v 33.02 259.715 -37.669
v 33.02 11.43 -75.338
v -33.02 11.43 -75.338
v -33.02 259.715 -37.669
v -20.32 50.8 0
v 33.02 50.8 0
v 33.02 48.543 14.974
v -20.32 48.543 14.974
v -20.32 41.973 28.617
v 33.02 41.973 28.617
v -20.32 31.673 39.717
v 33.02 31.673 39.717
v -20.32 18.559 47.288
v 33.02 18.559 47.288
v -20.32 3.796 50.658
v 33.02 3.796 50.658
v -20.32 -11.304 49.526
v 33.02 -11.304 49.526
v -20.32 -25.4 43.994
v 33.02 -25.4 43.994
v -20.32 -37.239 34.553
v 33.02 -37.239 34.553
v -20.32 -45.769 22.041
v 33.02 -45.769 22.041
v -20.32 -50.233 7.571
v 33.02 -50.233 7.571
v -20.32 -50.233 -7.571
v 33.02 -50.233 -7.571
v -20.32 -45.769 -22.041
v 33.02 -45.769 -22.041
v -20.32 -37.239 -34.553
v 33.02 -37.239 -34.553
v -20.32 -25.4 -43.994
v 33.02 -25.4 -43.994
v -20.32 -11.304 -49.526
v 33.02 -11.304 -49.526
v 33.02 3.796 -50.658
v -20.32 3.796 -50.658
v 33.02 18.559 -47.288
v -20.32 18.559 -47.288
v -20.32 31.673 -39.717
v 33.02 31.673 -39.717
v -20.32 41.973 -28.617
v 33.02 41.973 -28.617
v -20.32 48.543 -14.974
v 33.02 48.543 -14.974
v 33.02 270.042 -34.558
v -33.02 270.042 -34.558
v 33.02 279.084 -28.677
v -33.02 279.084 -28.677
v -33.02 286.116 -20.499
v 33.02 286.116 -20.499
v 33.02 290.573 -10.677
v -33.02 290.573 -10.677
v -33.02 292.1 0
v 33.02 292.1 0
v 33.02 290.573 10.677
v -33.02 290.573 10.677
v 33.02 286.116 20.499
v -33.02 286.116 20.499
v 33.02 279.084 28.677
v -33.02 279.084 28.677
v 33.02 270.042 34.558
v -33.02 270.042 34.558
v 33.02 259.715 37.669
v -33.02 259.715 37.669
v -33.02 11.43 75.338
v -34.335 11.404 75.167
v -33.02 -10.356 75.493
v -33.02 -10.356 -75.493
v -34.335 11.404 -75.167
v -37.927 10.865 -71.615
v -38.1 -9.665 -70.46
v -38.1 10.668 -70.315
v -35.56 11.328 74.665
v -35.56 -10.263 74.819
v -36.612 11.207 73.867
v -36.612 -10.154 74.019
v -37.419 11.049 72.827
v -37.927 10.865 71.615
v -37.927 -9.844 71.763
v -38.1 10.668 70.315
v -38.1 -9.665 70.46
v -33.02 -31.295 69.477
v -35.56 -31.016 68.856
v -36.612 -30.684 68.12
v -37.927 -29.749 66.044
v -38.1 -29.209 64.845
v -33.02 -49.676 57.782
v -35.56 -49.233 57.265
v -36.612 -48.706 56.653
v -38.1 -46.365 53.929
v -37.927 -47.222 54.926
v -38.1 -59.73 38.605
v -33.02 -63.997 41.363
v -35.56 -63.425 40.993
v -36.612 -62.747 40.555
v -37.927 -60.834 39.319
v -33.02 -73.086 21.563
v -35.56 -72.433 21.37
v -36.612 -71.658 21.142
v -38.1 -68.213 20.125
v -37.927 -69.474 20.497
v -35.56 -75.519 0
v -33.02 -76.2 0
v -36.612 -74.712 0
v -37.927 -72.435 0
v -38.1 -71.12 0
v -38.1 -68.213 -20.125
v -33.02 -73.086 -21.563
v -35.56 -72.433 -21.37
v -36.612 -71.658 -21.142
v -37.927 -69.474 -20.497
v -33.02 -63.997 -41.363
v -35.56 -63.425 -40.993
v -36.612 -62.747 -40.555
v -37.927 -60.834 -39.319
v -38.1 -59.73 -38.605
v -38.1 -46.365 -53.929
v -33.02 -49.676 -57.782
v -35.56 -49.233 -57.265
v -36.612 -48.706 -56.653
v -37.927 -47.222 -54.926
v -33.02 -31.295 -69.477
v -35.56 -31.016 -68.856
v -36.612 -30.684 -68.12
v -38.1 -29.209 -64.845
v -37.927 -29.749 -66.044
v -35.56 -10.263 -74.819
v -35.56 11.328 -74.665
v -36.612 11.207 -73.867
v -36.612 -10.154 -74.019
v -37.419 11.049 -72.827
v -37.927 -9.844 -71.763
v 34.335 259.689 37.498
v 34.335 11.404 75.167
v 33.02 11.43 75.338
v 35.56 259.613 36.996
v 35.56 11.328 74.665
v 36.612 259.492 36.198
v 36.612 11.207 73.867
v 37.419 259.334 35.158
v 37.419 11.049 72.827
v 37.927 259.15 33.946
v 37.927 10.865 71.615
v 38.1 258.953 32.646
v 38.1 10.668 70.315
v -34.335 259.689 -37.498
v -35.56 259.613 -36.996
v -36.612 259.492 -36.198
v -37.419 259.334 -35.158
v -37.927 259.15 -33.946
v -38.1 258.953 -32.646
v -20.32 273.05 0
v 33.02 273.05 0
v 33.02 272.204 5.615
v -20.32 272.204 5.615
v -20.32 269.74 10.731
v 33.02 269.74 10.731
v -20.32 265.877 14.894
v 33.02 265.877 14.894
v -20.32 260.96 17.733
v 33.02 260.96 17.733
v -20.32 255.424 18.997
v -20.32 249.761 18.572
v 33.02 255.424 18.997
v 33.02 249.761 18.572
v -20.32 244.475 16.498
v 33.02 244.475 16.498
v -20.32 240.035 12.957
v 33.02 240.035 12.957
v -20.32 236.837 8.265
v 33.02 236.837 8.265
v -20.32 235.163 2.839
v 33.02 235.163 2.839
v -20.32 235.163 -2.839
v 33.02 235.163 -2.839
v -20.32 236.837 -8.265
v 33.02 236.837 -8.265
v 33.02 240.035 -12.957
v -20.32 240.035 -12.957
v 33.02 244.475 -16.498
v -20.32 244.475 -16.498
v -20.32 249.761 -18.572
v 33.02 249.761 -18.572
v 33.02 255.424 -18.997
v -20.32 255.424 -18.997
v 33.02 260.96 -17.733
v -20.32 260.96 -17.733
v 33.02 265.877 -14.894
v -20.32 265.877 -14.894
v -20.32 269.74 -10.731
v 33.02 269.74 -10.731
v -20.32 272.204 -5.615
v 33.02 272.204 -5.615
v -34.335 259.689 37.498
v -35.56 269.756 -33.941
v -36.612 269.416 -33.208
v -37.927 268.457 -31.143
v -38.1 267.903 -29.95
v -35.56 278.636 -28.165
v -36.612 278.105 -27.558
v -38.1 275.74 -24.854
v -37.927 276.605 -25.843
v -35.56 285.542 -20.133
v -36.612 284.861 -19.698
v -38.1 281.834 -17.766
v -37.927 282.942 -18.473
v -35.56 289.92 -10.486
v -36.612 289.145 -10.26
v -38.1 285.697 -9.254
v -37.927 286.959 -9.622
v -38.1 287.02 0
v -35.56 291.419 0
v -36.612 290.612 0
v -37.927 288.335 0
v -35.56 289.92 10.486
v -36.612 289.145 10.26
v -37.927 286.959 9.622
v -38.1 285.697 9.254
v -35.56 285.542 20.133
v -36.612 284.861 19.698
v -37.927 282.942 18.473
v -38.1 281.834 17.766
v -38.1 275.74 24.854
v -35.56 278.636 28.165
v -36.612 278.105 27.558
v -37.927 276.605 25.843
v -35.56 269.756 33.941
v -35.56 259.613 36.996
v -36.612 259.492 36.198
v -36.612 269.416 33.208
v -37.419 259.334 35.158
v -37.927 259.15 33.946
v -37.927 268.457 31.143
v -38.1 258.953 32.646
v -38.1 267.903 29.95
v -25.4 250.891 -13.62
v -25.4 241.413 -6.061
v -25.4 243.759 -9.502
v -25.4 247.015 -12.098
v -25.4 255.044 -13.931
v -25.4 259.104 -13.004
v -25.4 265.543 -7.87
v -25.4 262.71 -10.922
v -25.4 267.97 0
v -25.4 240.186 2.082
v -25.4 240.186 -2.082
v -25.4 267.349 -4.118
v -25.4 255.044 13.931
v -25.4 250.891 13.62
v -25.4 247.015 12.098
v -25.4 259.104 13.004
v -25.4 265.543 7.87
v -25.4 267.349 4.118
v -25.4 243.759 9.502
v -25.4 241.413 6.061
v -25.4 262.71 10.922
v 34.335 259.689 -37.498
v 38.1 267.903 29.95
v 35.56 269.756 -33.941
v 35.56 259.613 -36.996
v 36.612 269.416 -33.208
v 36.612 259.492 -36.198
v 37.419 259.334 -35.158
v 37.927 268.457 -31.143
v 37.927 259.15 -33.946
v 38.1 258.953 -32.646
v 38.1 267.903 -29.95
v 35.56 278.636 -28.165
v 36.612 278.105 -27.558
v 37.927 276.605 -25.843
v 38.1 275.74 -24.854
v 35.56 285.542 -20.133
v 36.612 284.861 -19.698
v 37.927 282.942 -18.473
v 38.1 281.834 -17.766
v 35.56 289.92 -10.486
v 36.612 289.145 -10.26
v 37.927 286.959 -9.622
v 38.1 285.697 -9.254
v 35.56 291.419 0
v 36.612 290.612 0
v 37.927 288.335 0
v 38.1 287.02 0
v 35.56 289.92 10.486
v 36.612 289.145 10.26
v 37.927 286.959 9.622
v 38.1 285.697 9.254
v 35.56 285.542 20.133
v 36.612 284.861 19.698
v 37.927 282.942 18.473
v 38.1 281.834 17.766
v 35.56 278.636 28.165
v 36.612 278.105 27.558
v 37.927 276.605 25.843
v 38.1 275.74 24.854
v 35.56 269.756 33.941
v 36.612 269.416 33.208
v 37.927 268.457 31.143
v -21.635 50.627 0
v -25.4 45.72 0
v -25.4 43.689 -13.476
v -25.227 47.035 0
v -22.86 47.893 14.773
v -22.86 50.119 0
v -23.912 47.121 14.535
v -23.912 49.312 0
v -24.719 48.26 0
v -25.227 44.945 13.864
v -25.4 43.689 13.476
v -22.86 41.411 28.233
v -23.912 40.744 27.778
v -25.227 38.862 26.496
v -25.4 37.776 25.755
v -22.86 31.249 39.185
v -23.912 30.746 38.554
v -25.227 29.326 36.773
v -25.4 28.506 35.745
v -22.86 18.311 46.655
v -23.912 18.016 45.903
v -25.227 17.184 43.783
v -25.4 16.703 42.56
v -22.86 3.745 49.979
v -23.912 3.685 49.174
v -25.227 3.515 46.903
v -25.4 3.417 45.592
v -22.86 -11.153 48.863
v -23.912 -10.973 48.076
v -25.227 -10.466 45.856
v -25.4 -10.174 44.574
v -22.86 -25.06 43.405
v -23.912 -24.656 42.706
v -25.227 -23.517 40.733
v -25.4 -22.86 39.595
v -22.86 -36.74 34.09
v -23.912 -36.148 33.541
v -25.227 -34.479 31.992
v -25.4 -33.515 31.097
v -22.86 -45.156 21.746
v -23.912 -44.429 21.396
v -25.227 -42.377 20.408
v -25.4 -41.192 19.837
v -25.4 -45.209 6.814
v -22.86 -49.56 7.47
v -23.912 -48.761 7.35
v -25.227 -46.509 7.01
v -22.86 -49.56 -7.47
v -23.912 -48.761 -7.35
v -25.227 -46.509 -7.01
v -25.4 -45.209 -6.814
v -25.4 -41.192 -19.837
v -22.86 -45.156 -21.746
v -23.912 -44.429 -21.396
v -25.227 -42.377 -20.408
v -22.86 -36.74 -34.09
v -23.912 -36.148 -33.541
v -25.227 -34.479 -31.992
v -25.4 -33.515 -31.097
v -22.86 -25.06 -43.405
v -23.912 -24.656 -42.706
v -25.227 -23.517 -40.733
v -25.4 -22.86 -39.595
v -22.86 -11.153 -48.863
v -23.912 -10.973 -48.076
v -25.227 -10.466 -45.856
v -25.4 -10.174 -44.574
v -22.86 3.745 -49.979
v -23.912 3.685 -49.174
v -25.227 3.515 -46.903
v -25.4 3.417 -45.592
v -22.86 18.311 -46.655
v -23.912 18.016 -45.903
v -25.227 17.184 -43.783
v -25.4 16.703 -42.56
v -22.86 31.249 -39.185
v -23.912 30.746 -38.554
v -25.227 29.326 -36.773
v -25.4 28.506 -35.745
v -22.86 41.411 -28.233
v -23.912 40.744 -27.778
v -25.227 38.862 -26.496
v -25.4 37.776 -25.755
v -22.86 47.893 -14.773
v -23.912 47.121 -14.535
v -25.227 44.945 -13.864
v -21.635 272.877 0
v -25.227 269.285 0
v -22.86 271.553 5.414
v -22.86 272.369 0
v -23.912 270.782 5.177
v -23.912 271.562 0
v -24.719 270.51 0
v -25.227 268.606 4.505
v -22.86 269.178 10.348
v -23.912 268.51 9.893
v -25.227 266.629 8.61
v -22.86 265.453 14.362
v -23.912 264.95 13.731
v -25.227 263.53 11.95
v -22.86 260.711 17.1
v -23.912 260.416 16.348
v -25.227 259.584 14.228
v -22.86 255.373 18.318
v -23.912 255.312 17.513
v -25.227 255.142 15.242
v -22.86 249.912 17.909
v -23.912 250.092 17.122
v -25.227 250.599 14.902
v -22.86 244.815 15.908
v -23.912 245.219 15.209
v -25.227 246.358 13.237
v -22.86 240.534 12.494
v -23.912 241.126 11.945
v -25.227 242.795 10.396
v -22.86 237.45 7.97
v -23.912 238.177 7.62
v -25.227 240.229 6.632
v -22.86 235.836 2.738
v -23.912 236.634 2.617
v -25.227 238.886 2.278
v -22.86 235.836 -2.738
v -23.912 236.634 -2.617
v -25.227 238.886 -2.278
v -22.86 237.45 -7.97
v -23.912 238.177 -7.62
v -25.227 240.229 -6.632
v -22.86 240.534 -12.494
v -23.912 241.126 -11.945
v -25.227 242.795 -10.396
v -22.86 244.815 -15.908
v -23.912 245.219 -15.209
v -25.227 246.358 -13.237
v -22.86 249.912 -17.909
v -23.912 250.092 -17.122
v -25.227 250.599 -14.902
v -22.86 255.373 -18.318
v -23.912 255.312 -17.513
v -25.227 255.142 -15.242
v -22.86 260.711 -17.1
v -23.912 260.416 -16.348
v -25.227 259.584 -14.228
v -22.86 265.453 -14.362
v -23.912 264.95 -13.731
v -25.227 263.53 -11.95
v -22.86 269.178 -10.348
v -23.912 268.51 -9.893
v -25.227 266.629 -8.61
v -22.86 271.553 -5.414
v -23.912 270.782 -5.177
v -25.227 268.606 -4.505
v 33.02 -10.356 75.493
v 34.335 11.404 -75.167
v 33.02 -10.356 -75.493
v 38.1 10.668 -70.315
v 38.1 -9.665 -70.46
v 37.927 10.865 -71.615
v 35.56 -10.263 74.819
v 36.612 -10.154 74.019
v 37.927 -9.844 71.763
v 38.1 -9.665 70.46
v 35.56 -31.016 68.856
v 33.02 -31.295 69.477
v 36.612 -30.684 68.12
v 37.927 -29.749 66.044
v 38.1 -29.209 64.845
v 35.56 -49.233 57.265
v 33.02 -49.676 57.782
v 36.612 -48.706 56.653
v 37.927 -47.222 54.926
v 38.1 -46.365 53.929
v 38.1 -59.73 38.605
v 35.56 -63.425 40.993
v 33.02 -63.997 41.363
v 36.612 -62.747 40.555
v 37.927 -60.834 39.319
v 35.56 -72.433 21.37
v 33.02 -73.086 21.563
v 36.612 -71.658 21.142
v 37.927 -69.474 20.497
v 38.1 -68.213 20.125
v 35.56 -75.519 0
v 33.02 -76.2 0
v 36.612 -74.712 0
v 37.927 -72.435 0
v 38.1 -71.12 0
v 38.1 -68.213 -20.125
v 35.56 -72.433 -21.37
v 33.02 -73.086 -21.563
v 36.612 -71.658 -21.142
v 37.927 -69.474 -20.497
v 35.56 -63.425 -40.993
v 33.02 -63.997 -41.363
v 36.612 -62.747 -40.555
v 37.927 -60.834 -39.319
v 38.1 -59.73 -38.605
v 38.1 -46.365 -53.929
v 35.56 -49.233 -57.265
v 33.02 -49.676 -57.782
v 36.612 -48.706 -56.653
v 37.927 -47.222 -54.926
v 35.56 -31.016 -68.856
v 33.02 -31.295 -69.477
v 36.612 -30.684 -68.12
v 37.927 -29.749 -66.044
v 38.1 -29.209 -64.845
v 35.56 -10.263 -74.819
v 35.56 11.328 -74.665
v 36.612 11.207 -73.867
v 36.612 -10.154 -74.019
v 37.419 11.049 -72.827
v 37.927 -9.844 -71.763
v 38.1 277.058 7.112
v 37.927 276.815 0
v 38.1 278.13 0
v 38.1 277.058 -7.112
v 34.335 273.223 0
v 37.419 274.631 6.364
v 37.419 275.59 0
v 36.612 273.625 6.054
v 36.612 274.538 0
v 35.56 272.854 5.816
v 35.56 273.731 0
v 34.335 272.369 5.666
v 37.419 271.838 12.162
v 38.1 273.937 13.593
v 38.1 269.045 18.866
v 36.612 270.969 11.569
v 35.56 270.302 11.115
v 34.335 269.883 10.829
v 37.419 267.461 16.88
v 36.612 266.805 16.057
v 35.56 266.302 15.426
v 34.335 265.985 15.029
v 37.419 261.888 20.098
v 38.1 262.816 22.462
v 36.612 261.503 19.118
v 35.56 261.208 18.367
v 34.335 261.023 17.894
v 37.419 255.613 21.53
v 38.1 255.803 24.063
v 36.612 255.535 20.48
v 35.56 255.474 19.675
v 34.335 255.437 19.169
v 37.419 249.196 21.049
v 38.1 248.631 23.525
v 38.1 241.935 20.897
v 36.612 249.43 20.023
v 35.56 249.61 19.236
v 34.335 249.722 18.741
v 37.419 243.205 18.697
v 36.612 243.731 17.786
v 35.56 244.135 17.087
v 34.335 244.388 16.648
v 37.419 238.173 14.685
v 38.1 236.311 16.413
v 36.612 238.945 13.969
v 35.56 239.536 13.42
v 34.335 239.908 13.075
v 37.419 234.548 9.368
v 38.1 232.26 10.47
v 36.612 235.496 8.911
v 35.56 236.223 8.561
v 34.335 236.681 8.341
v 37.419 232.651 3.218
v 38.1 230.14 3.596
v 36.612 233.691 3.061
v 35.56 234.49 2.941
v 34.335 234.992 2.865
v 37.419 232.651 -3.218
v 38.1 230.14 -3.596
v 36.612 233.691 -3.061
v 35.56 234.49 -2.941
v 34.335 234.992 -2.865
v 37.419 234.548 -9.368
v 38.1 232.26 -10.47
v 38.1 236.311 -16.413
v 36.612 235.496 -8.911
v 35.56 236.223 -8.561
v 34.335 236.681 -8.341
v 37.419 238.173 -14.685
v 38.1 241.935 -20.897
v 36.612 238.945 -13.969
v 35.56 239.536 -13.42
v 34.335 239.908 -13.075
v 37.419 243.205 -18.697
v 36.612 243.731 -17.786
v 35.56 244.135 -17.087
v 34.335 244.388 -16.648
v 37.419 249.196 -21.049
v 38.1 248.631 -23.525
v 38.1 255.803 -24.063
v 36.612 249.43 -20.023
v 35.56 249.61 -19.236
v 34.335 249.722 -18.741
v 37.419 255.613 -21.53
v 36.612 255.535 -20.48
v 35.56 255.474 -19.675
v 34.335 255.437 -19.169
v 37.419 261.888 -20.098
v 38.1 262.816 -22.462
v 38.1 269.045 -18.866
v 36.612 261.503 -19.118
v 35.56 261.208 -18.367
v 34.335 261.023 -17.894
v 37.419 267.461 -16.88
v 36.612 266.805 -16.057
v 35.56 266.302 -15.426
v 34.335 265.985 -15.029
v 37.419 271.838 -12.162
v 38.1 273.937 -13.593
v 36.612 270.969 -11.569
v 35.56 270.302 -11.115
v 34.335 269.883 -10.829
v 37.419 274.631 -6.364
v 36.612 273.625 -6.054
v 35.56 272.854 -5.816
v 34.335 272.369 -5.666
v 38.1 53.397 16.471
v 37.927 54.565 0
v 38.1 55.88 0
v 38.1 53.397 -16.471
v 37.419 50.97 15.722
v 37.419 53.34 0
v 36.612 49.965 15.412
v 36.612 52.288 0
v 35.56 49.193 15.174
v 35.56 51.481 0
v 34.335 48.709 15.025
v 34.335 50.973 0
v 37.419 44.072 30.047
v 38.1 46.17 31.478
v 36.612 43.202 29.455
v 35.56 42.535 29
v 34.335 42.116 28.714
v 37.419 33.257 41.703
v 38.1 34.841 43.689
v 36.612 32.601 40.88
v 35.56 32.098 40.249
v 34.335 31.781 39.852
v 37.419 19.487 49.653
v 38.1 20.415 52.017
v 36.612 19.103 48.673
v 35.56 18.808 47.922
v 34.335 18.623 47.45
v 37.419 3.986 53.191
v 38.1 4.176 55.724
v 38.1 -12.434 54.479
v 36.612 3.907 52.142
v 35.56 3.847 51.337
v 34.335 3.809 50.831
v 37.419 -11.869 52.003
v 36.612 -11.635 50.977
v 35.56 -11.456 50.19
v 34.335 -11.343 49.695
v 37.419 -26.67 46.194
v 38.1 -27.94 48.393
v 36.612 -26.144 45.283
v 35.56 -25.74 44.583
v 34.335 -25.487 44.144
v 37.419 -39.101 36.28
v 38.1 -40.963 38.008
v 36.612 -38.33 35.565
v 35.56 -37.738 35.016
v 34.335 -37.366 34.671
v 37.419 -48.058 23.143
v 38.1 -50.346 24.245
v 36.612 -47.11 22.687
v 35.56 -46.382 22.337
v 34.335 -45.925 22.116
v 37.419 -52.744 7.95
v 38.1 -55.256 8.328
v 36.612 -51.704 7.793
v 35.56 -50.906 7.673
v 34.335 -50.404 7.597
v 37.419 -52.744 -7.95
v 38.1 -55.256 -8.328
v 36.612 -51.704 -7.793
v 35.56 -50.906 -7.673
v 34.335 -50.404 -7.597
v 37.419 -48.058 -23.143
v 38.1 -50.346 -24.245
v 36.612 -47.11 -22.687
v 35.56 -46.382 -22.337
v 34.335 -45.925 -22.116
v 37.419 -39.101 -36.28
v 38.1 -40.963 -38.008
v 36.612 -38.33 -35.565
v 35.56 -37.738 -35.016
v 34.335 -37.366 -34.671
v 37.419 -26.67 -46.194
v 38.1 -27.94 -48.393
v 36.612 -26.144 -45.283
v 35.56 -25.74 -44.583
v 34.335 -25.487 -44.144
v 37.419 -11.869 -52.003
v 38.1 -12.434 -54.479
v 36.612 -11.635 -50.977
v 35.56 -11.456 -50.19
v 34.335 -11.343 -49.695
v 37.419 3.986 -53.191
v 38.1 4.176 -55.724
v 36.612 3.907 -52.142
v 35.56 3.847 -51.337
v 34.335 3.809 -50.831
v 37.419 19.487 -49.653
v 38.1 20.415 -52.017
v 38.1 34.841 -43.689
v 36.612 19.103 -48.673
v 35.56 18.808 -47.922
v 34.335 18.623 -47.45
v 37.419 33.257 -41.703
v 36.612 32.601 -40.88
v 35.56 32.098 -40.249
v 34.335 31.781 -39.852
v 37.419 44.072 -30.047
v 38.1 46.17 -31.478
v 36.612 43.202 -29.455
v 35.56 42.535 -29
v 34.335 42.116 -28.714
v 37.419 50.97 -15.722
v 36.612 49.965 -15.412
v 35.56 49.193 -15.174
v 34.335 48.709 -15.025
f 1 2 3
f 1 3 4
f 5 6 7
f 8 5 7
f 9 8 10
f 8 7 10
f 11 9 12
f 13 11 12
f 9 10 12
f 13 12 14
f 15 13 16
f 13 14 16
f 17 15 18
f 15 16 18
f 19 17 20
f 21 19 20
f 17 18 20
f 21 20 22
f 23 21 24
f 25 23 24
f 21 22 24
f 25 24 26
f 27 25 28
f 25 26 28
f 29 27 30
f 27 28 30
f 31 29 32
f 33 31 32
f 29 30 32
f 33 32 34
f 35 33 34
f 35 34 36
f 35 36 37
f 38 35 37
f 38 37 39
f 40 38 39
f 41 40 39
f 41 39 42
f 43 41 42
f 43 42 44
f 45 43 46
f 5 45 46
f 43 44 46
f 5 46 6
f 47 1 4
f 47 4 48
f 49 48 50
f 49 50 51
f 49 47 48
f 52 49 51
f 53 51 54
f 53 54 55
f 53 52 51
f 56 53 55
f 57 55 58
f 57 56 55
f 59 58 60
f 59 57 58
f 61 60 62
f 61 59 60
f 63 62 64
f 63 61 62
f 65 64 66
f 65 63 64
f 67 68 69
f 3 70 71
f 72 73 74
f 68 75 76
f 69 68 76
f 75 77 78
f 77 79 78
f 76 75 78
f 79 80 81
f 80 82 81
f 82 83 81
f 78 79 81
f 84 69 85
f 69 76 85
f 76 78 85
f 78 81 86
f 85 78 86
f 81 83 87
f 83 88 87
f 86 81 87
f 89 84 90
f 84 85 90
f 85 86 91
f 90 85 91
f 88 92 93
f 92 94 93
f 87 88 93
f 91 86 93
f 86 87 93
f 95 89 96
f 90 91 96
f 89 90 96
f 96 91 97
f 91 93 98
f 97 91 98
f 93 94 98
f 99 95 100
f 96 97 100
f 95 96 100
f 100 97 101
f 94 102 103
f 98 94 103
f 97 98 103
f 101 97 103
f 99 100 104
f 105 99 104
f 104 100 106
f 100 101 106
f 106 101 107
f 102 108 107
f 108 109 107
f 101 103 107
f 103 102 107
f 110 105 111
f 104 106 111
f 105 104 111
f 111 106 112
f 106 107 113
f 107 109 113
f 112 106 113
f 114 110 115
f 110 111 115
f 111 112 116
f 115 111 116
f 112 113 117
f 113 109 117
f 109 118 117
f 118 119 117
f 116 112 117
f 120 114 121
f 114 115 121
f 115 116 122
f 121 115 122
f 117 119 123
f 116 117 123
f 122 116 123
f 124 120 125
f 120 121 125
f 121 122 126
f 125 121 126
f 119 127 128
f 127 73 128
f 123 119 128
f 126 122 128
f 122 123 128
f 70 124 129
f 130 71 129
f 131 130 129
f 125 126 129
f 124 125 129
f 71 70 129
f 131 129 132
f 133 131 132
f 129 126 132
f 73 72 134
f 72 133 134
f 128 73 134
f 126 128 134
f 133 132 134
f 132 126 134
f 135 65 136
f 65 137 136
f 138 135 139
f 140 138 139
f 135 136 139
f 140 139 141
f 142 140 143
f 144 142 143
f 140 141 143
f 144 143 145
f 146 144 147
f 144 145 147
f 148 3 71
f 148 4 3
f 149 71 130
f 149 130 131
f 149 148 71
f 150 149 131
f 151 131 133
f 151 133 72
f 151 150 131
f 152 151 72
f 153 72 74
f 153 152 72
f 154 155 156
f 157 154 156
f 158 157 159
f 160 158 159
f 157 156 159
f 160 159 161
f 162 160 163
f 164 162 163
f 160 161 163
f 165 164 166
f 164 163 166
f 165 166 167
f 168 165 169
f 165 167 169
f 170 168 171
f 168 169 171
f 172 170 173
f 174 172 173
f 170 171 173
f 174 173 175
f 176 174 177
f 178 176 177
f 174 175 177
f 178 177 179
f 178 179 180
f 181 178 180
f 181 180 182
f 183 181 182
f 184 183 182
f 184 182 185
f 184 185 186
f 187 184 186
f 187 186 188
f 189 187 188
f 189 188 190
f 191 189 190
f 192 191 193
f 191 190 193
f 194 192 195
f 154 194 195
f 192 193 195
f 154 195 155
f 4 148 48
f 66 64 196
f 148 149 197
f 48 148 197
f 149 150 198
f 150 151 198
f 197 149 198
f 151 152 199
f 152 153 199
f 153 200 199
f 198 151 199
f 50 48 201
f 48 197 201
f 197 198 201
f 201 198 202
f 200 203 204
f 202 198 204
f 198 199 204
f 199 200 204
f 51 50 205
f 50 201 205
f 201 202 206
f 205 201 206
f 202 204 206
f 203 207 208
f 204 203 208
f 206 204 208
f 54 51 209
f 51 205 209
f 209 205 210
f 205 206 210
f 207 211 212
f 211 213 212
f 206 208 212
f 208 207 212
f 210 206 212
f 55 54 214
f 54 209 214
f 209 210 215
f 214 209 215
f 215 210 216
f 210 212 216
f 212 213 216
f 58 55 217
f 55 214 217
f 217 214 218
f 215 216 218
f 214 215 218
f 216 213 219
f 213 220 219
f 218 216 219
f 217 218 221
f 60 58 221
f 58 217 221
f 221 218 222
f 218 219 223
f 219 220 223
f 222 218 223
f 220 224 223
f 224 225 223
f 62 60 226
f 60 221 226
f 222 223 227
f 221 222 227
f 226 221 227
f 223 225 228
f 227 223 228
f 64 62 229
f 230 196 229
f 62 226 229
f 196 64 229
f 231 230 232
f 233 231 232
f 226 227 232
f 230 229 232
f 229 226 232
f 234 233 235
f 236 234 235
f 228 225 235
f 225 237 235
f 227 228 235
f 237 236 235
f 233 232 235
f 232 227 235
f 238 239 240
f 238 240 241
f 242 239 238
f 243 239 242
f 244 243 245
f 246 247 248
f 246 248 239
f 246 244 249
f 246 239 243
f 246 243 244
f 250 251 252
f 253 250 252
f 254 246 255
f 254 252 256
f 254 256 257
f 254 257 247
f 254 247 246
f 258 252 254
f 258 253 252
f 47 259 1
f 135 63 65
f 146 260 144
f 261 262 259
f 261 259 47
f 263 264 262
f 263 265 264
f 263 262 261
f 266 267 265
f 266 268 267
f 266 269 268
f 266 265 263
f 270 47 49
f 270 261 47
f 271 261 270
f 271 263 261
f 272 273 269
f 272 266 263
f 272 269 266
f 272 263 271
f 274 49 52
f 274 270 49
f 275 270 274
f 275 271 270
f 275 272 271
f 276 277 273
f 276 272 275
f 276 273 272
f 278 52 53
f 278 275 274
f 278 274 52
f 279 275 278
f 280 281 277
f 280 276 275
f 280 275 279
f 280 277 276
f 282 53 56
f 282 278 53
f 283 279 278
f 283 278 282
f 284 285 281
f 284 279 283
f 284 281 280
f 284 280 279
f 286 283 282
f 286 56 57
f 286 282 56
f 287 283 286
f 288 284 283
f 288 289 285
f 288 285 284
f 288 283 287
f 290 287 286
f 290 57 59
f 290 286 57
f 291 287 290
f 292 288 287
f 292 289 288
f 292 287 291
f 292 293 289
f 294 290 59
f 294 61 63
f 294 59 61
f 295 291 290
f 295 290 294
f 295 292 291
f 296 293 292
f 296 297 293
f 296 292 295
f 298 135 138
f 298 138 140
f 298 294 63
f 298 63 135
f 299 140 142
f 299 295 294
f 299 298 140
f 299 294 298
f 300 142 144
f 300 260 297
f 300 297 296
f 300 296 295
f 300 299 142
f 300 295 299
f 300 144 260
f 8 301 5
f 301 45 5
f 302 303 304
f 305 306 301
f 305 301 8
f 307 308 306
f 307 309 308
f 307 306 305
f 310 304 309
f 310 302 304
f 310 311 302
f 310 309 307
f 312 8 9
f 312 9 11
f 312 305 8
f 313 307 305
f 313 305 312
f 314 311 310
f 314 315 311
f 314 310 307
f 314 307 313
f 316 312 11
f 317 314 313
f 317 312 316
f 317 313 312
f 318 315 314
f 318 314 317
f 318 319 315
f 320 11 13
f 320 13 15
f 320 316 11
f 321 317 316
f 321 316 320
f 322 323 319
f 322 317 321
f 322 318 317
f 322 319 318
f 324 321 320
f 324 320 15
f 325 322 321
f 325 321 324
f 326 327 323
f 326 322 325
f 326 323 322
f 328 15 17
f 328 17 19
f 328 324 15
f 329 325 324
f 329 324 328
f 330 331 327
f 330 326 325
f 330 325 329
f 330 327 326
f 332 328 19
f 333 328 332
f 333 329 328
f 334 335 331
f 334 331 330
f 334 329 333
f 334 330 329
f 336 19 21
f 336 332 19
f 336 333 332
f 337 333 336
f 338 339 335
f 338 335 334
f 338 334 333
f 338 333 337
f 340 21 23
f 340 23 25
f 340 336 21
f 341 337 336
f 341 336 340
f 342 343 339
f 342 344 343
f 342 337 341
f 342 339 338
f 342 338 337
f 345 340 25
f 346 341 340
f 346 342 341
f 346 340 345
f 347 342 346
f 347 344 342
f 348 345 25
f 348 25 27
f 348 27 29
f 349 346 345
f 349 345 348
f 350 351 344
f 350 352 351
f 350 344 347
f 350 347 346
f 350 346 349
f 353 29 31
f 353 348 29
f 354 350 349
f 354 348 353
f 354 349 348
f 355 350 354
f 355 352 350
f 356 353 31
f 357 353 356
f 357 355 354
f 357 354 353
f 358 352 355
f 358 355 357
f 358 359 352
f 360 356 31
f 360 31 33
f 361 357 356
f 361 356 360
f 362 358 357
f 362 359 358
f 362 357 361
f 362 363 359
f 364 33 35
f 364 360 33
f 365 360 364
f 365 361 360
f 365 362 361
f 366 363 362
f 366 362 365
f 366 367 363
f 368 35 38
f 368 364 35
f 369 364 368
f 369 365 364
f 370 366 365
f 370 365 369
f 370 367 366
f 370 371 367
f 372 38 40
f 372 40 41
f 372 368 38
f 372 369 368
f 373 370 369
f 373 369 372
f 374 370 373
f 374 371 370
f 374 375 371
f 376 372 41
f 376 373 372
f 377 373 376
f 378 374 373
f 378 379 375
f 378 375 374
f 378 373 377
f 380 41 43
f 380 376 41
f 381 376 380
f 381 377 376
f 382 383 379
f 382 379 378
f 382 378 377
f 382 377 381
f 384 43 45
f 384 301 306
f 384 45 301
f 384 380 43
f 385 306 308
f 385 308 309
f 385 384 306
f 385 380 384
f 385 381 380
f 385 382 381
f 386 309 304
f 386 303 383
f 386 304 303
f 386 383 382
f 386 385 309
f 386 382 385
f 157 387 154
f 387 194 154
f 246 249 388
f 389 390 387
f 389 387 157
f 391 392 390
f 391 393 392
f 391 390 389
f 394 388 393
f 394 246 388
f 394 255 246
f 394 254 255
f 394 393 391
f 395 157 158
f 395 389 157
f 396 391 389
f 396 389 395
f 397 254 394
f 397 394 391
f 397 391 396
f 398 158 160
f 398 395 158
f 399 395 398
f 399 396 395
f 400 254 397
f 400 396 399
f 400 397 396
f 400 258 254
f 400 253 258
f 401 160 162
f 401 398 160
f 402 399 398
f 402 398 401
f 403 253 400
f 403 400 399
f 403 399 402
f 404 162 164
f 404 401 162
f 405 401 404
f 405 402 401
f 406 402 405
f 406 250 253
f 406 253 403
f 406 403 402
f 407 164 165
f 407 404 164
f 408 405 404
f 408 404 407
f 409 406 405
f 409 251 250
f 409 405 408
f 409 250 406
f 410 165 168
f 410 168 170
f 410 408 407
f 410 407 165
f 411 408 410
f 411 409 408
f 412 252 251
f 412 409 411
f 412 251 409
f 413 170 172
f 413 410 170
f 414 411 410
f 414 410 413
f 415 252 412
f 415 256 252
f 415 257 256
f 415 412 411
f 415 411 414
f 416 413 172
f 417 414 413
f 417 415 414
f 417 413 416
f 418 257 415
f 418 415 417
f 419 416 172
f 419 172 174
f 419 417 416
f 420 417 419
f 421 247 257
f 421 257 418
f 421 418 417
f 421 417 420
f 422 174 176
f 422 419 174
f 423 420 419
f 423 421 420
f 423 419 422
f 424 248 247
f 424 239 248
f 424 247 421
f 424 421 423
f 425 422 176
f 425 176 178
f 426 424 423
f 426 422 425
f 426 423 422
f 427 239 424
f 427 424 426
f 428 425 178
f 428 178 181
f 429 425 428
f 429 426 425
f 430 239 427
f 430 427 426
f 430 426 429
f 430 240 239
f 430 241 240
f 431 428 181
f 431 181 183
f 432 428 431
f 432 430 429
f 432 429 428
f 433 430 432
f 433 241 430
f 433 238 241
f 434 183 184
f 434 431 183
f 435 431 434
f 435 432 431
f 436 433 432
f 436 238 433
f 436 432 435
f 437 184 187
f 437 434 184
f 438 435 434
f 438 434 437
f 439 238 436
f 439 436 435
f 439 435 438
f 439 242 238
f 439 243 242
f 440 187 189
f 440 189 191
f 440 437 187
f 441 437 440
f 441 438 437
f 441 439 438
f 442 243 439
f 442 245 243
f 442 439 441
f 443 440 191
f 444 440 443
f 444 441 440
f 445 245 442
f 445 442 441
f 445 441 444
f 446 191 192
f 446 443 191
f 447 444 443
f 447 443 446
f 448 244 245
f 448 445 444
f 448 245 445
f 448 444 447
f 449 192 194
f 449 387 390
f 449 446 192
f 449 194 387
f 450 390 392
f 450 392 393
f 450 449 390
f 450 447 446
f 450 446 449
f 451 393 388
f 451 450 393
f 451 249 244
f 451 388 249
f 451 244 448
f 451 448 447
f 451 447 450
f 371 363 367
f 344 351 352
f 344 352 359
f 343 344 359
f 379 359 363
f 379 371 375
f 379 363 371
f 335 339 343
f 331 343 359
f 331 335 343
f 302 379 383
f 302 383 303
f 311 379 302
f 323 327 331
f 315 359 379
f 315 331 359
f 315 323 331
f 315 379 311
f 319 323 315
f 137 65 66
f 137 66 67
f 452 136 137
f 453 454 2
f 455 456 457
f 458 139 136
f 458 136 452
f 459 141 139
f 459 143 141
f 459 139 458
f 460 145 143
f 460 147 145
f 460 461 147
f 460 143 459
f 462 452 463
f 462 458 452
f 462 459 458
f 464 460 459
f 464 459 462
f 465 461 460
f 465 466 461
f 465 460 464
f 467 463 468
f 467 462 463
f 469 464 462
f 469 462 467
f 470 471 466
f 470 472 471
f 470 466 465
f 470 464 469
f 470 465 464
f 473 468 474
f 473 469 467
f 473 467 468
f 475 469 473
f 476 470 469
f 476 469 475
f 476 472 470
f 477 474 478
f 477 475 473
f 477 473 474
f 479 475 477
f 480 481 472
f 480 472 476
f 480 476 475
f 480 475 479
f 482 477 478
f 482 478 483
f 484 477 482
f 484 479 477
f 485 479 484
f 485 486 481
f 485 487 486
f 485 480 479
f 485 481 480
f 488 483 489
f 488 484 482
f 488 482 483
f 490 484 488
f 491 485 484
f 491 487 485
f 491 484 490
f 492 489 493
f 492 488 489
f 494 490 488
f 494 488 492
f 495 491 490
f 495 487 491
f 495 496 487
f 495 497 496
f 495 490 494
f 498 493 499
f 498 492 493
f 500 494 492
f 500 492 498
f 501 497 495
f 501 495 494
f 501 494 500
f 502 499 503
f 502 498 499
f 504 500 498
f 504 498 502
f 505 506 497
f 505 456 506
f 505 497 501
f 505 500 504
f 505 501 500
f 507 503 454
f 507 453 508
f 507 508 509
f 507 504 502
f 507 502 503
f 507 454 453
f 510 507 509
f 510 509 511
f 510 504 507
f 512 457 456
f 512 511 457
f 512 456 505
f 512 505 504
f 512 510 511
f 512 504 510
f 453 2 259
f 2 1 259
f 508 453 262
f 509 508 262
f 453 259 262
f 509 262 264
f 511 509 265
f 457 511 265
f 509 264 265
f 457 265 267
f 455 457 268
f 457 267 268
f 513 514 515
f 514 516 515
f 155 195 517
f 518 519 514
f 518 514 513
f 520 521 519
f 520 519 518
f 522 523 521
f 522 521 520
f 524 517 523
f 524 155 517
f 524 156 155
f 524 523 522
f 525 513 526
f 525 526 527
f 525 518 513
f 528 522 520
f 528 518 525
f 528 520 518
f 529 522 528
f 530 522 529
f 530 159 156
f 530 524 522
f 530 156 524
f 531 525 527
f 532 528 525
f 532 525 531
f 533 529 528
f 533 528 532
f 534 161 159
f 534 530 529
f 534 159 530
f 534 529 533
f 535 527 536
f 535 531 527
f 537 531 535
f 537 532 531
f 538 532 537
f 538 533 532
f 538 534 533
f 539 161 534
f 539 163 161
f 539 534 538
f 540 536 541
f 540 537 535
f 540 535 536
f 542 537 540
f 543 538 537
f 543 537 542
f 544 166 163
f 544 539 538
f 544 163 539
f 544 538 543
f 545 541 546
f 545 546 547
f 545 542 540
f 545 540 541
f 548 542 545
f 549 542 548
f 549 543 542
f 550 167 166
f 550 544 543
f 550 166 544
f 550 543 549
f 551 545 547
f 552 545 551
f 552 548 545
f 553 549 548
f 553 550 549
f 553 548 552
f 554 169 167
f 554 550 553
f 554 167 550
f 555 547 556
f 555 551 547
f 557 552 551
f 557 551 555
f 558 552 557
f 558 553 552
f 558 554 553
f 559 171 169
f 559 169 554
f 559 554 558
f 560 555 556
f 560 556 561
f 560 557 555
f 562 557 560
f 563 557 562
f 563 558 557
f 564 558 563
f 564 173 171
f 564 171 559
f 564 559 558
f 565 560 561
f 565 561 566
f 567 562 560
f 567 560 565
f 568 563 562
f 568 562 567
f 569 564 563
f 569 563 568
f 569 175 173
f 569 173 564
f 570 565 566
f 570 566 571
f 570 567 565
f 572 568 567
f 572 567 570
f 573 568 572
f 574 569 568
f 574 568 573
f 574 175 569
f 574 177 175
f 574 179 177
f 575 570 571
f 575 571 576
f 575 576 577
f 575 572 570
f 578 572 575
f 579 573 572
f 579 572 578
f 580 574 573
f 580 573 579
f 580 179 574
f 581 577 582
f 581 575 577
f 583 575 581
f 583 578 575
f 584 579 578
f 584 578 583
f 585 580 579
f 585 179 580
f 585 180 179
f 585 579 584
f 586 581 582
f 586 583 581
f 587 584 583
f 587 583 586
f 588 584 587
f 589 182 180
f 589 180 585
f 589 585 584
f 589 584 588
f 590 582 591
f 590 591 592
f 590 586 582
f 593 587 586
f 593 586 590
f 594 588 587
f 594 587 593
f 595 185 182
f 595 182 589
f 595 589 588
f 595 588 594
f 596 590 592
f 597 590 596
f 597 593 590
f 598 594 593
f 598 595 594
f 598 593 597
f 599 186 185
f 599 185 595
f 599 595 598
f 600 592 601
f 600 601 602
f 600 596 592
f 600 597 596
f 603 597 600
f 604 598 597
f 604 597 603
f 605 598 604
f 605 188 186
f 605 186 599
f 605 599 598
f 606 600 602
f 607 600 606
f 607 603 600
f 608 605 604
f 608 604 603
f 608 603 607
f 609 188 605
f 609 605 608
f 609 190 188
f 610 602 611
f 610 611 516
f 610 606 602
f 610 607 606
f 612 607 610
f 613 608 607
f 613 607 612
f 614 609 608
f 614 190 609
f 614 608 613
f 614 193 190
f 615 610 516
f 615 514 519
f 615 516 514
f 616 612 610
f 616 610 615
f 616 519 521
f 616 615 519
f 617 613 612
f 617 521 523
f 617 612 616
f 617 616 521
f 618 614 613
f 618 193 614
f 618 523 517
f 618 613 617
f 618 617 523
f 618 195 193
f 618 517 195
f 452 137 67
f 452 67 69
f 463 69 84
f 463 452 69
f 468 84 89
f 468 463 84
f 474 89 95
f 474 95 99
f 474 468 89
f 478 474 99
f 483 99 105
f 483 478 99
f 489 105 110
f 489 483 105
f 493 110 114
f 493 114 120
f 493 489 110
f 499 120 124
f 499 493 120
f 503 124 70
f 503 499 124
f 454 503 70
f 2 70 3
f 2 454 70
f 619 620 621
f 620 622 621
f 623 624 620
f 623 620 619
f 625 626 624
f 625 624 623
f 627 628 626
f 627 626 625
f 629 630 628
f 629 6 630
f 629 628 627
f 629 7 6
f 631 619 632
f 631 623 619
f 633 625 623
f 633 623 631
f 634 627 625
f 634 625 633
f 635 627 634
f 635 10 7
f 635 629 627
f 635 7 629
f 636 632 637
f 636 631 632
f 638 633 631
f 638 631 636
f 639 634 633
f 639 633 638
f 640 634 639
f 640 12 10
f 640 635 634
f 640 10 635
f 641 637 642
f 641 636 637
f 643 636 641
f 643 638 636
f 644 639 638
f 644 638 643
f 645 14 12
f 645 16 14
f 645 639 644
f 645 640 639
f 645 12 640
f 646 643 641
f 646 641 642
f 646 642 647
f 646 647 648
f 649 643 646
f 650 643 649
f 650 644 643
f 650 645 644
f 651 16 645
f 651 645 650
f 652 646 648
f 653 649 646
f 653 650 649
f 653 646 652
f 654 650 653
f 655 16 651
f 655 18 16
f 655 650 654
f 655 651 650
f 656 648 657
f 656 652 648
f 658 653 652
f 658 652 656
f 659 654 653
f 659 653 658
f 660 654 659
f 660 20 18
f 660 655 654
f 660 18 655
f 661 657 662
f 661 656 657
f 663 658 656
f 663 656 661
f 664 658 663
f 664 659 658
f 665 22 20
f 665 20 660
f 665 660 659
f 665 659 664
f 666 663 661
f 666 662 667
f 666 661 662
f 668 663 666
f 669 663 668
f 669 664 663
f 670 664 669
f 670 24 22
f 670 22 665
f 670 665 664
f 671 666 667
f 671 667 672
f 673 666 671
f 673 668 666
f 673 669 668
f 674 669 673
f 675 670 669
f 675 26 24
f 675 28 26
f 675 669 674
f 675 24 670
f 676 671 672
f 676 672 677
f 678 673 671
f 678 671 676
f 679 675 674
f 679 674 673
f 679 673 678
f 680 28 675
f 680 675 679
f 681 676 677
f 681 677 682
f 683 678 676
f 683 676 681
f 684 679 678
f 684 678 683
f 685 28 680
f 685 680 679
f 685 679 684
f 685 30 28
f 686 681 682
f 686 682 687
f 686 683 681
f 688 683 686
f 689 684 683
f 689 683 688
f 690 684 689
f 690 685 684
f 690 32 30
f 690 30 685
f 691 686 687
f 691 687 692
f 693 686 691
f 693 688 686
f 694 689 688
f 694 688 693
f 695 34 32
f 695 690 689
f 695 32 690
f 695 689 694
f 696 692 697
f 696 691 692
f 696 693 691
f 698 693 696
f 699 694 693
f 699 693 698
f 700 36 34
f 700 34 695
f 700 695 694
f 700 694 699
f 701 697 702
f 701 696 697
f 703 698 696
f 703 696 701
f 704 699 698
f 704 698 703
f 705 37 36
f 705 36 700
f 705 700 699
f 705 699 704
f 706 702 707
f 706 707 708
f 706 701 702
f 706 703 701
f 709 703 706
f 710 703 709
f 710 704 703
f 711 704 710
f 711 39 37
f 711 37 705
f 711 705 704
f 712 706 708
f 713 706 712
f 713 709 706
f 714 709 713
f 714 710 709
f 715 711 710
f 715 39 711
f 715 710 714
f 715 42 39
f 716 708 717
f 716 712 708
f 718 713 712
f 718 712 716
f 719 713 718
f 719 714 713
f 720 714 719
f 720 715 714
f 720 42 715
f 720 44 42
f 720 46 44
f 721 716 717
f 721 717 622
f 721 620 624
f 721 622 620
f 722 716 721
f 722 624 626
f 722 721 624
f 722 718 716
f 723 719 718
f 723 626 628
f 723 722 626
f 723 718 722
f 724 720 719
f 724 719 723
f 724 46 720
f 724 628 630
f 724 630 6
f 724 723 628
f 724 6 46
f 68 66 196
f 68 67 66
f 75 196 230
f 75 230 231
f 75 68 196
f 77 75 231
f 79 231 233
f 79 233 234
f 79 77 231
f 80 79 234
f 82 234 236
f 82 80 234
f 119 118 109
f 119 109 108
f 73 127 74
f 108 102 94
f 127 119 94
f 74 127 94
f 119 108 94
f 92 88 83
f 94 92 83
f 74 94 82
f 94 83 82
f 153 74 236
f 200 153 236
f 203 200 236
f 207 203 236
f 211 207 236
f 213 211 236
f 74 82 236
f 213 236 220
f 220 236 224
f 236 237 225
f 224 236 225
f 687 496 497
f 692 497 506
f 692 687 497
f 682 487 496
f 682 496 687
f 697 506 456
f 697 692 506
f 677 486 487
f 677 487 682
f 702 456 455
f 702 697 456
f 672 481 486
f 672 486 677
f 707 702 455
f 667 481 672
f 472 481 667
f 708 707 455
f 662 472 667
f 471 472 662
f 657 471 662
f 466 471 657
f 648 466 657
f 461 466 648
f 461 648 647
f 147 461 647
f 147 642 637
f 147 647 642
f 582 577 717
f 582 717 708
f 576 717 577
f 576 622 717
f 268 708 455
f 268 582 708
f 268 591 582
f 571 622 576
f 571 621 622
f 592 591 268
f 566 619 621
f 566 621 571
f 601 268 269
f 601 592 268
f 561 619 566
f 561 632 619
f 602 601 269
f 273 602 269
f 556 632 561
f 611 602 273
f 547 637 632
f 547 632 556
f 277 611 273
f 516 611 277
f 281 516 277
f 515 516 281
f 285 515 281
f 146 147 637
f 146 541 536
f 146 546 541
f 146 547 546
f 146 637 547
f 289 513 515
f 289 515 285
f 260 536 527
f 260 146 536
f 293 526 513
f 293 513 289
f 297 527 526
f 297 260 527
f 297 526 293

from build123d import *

# Parameters (mm, degrees)
F4_DEPTH = 38.1
F0_R     = 50.8
F0_R_2   = 19.05
F1_DEPTH = 63.5
F5_R     = 5.08
F2_R     = 5.08


with BuildPart() as f4:
    # F3 (on Right) → F4 (new body, symmetric)
    with BuildSketch(Plane.YZ):
        with BuildLine():
            ThreePointArc((11.43, 75.3378729458), (57.7815108837, 49.6763223276), (76.2, 0))
            ThreePointArc((76.2, 0), (57.7815108837, -49.6763223276), (11.43, -75.3378729458))
            Line((11.43, -75.3378729458), (259.715, -37.6689364729))
            ThreePointArc((259.715, -37.6689364729), (215.9, 0), (259.715, 37.6689364729))
            Line((259.715, 37.6689364729), (11.43, 75.3378729458))
        make_face()
        with BuildLine():
            ThreePointArc((11.43, -75.3378729458), (57.7815108837, -49.6763223276), (76.2, 0))
            ThreePointArc((76.2, 0), (57.7815108837, 49.6763223276), (11.43, 75.3378729458))
            ThreePointArc((11.43, 75.3378729458), (-76.2, 0), (11.43, -75.3378729458))
        make_face()
        with BuildLine():
            ThreePointArc((292.1, 0), (282.8907554418, 24.8381611638), (259.715, 37.6689364729))
            ThreePointArc((259.715, 37.6689364729), (215.9, 0), (259.715, -37.6689364729))
            ThreePointArc((259.715, -37.6689364729), (282.8907554418, -24.8381611638), (292.1, 0))
        make_face()
    extrude(amount=F4_DEPTH, both=True)

    # F0 (on face) → F1 (cut)
    with BuildSketch(Plane.YZ.offset(38.1)):
        Circle(F0_R)
        with Locations((254, 0)):
            Circle(F0_R_2)
    extrude(amount=-F1_DEPTH, mode=Mode.SUBTRACT)

    # F5
    f5_edges = [f4.edges().sort_by_distance(p)[0] for p in [
        (38.1, 135.5725, -56.503405),
        (38.1, -76.2, 0),
        (38.1, 292.1, 0),
        (38.1, 135.5725, 56.503405),
        (38.1, -50.8, 0),
        (38.1, 234.95, 0),
    ]]
    fillet(f5_edges, radius=F5_R)

    # F2
    f2_edges = [f4.edges().sort_by_distance(p)[0] for p in [
        (3.81, 50.8, 0),
        (33.02, -50.8, 0),
        (-25.4, -50.8, 0),
        (-38.1, 135.5725, -56.503405),
        (-38.1, 292.1, 0),
        (-38.1, 135.5725, 56.503405),
        (-38.1, -76.2, 0),
        (33.02, 234.95, 0),
        (-25.4, 234.95, 0),
    ]]
    fillet(f2_edges, radius=F2_R)


solid = f4.part
